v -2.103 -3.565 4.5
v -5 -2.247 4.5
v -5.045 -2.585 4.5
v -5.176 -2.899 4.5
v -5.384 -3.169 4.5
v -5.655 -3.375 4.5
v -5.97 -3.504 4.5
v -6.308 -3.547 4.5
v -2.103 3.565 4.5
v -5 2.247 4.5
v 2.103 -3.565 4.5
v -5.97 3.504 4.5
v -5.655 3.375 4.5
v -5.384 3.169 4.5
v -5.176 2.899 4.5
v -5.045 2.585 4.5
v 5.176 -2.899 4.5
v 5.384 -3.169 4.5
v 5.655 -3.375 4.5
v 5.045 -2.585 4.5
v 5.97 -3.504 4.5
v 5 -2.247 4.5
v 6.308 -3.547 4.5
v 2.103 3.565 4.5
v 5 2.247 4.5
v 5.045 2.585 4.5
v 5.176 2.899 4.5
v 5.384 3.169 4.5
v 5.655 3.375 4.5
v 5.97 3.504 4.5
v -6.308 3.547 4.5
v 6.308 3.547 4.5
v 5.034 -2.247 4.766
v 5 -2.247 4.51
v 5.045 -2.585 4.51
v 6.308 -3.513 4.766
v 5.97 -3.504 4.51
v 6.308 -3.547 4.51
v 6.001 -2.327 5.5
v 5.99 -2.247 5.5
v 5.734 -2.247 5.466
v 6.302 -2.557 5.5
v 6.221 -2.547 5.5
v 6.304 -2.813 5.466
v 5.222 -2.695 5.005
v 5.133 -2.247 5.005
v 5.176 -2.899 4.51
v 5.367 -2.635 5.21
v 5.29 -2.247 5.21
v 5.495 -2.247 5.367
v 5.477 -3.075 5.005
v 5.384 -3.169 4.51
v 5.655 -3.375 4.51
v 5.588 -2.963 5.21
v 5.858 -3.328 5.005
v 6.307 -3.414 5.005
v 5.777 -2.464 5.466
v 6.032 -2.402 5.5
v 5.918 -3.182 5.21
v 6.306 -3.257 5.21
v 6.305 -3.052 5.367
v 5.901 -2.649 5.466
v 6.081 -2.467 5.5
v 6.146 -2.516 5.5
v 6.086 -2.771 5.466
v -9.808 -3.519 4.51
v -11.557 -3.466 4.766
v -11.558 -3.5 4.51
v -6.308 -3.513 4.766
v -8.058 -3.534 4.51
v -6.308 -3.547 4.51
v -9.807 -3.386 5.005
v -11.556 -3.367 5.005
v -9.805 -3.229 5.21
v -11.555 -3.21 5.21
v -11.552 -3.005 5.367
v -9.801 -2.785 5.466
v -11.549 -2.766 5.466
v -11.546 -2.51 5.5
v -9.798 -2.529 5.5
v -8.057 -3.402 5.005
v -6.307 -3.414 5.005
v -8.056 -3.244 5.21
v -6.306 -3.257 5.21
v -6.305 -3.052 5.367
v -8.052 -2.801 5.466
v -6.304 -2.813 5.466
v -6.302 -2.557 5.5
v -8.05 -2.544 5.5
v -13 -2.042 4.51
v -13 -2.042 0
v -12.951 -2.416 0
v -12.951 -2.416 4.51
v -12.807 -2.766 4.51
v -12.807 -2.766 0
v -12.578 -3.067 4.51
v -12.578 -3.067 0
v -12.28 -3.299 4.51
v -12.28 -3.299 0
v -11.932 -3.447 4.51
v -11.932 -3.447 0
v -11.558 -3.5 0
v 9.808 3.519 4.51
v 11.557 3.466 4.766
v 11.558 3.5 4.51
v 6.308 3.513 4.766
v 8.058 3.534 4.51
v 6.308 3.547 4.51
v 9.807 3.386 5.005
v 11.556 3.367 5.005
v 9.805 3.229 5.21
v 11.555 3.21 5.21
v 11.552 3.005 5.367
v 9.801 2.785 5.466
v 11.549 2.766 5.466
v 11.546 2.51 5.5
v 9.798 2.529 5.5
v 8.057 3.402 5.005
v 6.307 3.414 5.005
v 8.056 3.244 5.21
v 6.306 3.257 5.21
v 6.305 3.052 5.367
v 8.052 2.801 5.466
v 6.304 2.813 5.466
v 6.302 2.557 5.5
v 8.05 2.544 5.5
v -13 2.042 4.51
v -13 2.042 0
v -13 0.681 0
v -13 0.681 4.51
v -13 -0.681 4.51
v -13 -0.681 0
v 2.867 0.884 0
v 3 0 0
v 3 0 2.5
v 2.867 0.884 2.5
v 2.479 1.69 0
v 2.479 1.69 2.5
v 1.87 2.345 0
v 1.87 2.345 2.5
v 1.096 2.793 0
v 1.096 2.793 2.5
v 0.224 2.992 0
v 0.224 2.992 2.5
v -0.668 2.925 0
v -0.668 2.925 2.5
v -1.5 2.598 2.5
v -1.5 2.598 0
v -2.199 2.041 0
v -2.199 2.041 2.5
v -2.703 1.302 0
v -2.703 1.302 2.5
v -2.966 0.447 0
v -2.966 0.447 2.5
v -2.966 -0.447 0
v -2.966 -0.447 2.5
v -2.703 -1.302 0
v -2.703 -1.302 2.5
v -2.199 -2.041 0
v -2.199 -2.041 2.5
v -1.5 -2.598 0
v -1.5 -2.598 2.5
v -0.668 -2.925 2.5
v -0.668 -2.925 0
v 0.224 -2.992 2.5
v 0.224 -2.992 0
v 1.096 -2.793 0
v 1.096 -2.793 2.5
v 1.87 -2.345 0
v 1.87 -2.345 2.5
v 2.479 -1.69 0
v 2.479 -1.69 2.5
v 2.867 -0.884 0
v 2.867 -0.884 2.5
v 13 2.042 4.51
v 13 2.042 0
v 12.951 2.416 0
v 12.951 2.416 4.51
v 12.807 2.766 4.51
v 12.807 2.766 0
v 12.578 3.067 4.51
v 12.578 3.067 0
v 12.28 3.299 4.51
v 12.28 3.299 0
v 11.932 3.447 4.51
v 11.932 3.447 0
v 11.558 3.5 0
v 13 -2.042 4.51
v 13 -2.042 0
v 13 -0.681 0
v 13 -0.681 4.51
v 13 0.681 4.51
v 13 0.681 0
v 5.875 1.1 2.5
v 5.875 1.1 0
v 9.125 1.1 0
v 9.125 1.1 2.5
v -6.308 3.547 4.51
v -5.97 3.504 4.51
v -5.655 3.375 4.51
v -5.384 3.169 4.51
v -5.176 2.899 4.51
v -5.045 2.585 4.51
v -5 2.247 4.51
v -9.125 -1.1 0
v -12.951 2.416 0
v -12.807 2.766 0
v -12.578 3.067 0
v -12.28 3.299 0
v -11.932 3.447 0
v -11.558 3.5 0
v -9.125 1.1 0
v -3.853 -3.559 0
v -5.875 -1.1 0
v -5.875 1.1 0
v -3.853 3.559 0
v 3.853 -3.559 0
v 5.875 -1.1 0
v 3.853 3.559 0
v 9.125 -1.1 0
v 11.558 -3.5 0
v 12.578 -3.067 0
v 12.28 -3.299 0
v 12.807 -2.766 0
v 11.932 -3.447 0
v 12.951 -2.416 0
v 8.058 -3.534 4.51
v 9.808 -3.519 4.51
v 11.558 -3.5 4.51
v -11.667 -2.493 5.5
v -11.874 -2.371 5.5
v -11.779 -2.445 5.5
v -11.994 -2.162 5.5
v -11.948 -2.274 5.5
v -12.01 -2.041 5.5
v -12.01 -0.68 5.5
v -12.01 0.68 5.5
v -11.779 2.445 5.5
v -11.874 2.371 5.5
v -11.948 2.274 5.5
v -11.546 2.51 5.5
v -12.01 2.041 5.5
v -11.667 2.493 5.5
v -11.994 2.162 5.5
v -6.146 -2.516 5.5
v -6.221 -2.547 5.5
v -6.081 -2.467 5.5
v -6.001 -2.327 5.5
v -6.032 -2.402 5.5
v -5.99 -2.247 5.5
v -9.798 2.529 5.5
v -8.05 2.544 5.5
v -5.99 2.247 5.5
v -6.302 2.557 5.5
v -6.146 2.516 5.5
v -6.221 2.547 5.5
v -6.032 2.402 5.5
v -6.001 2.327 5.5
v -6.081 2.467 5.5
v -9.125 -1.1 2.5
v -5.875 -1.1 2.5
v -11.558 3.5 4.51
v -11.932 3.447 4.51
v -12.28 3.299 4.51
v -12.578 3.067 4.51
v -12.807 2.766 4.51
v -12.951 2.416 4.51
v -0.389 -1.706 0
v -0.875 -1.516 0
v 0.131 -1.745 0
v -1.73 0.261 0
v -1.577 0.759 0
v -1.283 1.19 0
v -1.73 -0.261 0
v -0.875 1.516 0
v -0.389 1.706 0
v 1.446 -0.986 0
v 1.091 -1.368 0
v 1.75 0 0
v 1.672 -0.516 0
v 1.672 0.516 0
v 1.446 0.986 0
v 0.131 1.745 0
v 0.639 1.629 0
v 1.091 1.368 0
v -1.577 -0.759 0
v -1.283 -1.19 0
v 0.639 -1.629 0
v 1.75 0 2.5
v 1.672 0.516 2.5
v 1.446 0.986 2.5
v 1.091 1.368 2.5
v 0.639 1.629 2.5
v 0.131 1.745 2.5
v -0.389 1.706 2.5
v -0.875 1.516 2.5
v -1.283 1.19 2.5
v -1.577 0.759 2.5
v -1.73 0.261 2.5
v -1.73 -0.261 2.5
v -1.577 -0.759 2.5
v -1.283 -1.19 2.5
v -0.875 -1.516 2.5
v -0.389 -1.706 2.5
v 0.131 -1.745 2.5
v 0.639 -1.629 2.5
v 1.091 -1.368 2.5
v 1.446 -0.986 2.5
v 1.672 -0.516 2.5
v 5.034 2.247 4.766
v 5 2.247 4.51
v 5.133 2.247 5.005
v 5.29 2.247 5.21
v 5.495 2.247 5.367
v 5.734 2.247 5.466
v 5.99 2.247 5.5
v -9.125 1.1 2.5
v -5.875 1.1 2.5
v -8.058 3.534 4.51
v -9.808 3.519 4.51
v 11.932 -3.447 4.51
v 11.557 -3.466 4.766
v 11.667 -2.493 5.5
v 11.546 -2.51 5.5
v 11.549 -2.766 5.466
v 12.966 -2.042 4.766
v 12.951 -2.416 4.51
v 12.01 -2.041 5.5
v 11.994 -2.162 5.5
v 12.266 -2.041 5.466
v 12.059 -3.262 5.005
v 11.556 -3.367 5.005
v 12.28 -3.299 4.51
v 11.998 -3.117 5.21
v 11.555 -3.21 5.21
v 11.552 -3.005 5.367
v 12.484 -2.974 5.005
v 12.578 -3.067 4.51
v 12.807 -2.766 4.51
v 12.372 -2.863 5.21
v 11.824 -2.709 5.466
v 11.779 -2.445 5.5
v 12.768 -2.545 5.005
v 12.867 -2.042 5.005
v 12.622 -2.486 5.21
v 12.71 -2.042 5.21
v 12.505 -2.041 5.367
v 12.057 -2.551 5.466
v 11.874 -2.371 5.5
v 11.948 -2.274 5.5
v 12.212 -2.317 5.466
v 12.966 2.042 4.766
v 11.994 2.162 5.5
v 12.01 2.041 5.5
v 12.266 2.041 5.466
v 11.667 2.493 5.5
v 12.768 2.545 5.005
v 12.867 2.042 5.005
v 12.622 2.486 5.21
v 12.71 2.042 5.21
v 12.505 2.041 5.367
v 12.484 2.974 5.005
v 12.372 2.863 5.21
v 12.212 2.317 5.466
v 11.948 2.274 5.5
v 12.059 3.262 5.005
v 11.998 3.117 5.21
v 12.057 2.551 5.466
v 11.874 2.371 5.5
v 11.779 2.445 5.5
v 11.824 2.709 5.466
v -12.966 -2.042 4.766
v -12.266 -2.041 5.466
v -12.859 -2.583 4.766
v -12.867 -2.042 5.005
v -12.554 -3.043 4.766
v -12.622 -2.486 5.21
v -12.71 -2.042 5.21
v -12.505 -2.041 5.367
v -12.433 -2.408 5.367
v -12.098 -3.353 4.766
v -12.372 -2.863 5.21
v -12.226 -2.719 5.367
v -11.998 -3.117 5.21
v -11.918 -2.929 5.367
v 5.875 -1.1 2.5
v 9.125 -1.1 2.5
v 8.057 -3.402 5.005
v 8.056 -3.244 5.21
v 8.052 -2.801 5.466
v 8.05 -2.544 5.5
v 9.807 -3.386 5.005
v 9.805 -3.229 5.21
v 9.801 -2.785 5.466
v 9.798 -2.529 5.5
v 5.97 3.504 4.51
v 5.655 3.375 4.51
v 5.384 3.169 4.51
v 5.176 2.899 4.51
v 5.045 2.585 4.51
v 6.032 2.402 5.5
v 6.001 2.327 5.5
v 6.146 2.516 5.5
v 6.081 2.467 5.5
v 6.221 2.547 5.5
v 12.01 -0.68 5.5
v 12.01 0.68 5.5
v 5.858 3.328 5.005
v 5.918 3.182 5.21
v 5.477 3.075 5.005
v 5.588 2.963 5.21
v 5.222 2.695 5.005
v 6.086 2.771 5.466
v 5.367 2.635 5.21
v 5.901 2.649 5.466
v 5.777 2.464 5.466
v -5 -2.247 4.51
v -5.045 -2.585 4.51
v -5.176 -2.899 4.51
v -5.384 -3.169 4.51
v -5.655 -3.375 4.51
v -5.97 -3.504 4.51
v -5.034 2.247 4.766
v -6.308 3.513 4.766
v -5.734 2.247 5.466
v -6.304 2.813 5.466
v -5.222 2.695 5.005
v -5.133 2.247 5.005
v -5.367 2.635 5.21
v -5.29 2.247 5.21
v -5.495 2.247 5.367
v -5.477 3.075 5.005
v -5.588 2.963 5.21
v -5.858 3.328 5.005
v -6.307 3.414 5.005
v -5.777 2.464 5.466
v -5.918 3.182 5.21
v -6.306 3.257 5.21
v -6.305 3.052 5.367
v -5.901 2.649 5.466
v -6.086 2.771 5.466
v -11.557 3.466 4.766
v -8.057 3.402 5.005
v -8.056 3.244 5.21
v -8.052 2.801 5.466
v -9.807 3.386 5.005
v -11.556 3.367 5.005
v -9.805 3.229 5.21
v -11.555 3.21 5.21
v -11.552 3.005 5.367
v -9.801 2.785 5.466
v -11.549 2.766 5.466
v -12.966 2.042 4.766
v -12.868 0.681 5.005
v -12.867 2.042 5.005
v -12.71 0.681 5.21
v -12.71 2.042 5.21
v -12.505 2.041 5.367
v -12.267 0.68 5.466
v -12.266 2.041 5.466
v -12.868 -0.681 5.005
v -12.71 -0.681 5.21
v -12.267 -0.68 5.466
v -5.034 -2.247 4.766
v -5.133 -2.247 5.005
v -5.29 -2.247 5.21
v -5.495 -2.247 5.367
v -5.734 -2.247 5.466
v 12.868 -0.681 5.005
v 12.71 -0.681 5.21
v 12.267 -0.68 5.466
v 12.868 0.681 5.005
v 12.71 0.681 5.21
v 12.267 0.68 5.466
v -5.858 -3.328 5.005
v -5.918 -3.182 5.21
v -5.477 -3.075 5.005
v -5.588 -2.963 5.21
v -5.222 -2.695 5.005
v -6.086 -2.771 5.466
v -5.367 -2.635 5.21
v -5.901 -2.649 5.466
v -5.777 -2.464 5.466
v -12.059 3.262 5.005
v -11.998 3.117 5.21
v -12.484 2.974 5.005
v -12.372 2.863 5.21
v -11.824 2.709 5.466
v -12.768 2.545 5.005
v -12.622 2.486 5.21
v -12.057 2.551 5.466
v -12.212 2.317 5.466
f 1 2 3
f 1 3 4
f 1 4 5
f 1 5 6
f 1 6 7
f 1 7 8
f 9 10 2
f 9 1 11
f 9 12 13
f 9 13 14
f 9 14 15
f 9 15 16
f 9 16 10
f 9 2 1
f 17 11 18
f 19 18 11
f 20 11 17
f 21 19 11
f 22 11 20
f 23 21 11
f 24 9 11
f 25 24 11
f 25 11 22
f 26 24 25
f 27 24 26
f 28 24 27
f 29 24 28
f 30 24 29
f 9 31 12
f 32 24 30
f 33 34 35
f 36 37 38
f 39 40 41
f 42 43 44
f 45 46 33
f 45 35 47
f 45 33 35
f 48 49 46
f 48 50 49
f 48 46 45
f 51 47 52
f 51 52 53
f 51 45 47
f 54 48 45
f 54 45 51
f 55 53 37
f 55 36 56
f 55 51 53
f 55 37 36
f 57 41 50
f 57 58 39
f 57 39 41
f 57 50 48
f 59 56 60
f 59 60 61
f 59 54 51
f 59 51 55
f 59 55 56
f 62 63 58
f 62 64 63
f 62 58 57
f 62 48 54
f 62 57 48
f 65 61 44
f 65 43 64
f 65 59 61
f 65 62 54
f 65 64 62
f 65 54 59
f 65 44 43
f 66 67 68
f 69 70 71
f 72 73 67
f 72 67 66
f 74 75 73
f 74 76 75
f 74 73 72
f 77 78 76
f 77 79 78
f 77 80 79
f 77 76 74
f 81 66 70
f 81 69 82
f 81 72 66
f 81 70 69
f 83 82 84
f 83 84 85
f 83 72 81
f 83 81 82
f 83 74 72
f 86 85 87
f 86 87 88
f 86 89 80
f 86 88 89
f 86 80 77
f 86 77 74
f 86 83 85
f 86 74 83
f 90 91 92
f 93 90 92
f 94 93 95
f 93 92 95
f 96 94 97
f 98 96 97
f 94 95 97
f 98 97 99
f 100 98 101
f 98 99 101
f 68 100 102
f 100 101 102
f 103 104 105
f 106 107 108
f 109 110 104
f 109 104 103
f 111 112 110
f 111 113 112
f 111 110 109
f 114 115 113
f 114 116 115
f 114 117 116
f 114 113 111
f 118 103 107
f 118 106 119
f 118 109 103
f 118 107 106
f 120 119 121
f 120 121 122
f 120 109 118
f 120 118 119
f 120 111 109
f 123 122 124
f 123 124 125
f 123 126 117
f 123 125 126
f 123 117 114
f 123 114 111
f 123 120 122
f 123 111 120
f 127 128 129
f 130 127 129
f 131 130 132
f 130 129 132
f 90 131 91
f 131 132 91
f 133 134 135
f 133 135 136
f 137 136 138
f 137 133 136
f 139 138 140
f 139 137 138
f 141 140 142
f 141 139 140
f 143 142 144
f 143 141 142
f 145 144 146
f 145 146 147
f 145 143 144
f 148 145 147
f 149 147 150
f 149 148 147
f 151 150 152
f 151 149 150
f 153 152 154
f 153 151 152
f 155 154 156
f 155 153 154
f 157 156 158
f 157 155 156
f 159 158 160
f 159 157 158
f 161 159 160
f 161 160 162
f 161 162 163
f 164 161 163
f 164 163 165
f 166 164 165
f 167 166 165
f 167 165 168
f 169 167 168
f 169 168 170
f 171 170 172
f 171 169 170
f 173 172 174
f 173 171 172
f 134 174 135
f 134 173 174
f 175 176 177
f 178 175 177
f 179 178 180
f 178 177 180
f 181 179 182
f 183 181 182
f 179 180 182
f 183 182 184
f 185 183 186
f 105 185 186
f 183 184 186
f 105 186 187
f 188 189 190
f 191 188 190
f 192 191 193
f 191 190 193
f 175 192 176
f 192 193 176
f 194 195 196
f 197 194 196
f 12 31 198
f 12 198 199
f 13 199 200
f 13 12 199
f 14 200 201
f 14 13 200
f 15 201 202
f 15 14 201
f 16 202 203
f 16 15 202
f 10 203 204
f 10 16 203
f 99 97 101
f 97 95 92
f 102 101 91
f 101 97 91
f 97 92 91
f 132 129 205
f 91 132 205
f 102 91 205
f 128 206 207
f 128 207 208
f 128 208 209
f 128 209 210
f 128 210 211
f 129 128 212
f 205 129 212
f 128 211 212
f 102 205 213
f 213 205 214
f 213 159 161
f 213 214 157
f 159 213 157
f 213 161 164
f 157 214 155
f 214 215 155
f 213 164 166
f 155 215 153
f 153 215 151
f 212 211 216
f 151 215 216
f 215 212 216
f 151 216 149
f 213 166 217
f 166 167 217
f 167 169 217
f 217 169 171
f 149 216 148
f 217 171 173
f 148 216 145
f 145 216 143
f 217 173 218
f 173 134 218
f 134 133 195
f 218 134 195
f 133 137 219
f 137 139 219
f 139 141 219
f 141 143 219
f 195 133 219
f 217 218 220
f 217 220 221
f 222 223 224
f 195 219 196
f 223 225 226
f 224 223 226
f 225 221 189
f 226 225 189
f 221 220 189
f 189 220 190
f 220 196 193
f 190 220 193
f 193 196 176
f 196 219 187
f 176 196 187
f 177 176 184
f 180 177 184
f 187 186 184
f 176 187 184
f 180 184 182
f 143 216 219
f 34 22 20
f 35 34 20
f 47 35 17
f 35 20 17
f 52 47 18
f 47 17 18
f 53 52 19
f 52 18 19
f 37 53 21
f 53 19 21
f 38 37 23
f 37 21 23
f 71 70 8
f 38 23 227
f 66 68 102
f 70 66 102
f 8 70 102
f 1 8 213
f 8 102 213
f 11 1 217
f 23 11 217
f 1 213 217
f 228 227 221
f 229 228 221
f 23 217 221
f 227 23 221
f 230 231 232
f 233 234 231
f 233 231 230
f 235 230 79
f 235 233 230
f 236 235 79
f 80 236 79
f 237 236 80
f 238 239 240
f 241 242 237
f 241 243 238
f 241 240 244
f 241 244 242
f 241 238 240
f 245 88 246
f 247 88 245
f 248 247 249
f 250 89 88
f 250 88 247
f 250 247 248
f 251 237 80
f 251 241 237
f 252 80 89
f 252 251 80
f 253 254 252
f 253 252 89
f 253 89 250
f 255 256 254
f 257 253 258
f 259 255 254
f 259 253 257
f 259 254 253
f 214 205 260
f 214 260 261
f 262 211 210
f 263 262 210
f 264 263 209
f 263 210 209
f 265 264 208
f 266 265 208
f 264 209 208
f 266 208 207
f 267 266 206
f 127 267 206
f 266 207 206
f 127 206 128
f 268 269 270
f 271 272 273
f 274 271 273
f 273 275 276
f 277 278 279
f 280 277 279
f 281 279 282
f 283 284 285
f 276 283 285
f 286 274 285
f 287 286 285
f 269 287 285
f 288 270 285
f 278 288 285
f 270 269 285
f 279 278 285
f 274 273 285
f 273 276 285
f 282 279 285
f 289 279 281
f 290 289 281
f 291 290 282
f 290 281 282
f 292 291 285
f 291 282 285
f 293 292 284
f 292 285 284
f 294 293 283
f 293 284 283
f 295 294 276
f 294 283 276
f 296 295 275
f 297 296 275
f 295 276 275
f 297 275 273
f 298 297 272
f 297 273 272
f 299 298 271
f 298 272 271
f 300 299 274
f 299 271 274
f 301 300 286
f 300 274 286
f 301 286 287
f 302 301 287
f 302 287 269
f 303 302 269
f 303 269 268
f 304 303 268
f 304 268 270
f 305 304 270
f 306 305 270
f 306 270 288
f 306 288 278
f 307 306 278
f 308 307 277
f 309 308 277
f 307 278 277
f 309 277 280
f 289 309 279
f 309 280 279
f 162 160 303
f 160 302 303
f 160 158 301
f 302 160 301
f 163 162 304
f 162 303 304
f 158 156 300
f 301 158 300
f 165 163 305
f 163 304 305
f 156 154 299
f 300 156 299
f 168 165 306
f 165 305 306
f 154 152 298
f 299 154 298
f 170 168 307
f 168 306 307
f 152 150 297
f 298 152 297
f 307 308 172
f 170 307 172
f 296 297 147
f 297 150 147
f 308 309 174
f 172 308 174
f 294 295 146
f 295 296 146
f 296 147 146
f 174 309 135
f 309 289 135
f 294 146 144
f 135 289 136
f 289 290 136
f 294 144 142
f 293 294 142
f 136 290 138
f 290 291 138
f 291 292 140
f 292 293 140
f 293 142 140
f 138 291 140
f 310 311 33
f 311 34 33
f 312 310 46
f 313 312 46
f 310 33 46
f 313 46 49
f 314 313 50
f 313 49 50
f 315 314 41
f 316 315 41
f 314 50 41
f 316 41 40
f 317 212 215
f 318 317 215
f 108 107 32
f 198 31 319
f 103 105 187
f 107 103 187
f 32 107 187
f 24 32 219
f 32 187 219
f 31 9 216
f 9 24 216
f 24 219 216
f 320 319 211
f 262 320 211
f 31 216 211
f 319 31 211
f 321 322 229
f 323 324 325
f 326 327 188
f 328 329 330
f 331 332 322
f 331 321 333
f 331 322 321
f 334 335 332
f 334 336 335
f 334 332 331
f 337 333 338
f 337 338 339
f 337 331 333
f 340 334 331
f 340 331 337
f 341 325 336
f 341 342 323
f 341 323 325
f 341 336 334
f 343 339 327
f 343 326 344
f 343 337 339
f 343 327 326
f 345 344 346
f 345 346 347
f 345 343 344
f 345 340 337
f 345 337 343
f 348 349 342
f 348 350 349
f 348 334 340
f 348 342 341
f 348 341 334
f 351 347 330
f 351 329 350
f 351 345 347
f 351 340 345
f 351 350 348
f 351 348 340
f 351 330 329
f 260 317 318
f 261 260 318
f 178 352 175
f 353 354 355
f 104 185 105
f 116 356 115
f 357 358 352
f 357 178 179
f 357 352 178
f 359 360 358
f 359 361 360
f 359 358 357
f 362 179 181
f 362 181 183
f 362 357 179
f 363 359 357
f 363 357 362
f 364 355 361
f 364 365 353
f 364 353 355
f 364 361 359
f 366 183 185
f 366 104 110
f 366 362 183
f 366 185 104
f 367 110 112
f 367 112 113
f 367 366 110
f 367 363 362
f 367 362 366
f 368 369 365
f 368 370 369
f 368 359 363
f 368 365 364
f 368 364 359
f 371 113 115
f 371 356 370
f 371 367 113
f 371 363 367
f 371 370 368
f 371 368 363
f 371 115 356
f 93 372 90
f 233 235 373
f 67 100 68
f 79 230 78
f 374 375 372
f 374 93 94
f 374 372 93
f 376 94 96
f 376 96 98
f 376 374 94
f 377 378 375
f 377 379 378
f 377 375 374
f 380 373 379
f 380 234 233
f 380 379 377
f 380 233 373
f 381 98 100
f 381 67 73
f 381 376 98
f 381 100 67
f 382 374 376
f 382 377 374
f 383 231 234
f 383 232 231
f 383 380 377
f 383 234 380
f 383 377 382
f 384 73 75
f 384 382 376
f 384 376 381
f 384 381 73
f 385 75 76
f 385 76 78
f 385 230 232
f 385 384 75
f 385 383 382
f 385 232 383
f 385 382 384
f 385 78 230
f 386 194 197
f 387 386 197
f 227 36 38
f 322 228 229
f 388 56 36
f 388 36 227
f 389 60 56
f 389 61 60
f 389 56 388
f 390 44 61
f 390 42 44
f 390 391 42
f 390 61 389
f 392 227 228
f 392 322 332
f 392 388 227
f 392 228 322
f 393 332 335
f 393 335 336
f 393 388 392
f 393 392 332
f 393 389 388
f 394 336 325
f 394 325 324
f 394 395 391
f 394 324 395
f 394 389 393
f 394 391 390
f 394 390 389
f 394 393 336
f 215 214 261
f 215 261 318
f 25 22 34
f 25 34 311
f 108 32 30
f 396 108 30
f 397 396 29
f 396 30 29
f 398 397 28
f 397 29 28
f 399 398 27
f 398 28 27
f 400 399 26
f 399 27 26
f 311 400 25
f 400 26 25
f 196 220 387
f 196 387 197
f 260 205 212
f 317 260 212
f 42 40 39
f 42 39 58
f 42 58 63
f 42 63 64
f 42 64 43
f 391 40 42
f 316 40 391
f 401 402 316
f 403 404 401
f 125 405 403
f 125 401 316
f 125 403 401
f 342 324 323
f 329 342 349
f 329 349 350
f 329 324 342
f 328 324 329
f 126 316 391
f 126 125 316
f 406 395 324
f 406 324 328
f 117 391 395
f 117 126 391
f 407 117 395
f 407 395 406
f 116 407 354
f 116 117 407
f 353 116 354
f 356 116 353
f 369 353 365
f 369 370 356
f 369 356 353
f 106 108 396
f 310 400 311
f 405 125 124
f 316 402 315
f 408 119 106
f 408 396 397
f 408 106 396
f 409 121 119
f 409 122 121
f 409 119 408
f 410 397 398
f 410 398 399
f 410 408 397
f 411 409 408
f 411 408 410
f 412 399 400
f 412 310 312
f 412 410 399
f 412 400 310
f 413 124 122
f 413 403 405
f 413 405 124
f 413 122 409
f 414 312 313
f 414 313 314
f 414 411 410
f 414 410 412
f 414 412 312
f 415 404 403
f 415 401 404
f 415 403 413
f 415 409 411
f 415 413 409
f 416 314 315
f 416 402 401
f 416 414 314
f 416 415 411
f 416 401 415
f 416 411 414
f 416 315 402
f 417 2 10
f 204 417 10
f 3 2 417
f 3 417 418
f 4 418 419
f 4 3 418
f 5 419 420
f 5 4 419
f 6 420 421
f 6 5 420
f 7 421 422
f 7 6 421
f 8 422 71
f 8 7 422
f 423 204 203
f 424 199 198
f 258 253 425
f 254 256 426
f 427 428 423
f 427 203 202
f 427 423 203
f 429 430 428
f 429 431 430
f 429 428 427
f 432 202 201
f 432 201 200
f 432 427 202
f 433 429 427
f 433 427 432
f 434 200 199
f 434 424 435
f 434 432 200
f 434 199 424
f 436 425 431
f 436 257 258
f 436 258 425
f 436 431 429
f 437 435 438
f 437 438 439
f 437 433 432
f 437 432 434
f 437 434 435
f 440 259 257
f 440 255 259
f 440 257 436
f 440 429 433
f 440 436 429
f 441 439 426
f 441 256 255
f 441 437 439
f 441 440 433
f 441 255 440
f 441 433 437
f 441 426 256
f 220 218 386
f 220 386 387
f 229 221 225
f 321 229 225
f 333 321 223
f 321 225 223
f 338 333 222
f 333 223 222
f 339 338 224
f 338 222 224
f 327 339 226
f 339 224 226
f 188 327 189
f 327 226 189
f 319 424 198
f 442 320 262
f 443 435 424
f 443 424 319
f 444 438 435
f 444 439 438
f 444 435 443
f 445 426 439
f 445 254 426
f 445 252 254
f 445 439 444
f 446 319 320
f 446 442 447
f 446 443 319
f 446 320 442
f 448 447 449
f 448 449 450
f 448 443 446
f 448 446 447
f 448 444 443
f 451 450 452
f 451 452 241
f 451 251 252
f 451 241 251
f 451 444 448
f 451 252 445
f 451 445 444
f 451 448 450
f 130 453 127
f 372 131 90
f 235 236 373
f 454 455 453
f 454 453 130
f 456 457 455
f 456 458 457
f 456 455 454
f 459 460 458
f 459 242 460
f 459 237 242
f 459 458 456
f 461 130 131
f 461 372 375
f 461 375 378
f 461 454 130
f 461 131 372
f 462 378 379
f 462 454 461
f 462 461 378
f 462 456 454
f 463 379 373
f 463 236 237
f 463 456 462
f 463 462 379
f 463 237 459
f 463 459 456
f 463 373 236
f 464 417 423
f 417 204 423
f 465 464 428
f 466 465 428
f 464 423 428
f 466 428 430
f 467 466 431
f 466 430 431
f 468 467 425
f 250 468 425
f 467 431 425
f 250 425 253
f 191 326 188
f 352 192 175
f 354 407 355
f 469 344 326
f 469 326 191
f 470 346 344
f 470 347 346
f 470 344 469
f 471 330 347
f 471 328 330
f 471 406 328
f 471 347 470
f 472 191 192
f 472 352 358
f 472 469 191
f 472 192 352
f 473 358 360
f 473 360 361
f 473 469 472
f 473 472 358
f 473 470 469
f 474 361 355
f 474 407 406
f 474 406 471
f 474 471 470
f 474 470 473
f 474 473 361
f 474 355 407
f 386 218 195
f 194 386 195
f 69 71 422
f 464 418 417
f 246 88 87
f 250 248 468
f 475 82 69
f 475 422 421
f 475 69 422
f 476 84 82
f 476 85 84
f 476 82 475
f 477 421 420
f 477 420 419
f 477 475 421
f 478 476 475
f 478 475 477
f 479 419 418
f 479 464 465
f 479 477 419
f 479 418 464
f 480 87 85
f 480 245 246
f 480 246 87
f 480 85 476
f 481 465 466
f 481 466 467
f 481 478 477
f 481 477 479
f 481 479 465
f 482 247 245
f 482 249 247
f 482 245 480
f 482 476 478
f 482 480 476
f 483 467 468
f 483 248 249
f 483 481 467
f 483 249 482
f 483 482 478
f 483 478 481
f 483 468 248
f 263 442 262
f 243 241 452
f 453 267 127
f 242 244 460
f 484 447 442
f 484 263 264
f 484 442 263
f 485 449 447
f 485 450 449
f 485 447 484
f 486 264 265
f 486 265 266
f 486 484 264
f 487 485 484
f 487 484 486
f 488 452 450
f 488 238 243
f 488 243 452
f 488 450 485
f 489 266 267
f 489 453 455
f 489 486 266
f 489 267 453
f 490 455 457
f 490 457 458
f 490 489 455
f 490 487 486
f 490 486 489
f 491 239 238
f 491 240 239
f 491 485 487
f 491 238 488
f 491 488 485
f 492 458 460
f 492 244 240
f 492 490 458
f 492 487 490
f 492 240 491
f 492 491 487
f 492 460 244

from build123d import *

# Parameters (mm, degrees)
SKETCH039_R   = 3
SKETCH039_R_2 = 1.75
SKETCH039_W   = 3.25
SKETCH039_H   = 2.2
PAD022_DEPTH  = 2.5
SKETCH026_W   = 10
SKETCH026_H   = 9
PAD020_DEPTH  = 2
PAD019_DEPTH  = 5.5
FILLET003_R   = 1.3
FILLET004_R   = 0.99


with BuildPart() as pad_button_zoom_holes:
    # Sketch039 → Pad022 (new body)
    with BuildSketch(Plane.XY):
        Circle(SKETCH039_R)
        Circle(SKETCH039_R_2, mode=Mode.SUBTRACT)
        with Locations((-7.5, 0)):
            Rectangle(SKETCH039_W, SKETCH039_H)
        with Locations((7.5, 0)):
            Rectangle(SKETCH039_W, SKETCH039_H)
    extrude(amount=PAD022_DEPTH)


with BuildPart() as pad_button_zoom_cutout:
    # Sketch026 → Pad020 (new body)
    with BuildSketch(Plane.XY.offset(4.5)):
        Rectangle(SKETCH026_W, SKETCH026_H)
    extrude(amount=PAD020_DEPTH)


with BuildPart() as cut_button_zoom_final:
    # Sketch025 → Pad019 (new body)
    with BuildSketch(Plane.XY):
        with BuildLine():
            ThreePointArc((11.557852, 3.5), (0, 3.566794), (-11.557852, 3.5))
            ThreePointArc((-11.557852, 3.5), (-12.578424, 3.066971), (-12.999999, 2.041615))
            ThreePointArc((-12.999999, 2.041615), (-13.000368, 0), (-13, -2.041615))
            ThreePointArc((-13, -2.041615), (-12.578425, -3.066972), (-11.557852, -3.5))
            ThreePointArc((-11.557852, -3.5), (0, -3.566794), (11.557852, -3.5))
            ThreePointArc((11.557852, -3.5), (12.578425, -3.066972), (13, -2.041615))
            ThreePointArc((13, -2.041615), (13.000368, 0), (12.999999, 2.041615))
            ThreePointArc((12.999999, 2.041615), (12.578424, 3.066971), (11.557852, 3.5))
        make_face()
    extrude(amount=PAD019_DEPTH)

    # Cut007: cut Pad (button zoom cutout)
    add(pad_button_zoom_cutout.part, mode=Mode.SUBTRACT)

    # Fillet003
    fillet003_edges = [cut_button_zoom_final.edges().sort_by_distance(p)[0] for p in [
        (-5, 3.554294, 5),
        (5, 3.554294, 5),
        (-5, -3.554294, 5),
        (5, -3.554294, 5),
    ]]
    fillet(fillet003_edges, radius=FILLET003_R)

    # Fillet004
    fillet004_edges = [cut_button_zoom_final.edges().sort_by_distance(p)[0] for p in [
        (-8.933057, 3.526894, 5.5),
        (8.933057, 3.526894, 5.5),
        (-5.383665, 3.169057, 5.5),
        (-12.578424, 3.066971, 5.5),
        (-5, 0, 5.5),
        (-13.000368, 0, 5.5),
        (-5.383665, -3.169057, 5.5),
        (-12.578425, -3.066972, 5.5),
        (-8.933057, -3.526894, 5.5),
        (12.578424, 3.066971, 5.5),
        (5.383665, 3.169057, 5.5),
        (5, 0, 5.5),
        (13.000368, 0, 5.5),
        (5.383665, -3.169057, 5.5),
        (12.578425, -3.066972, 5.5),
        (8.933057, -3.526894, 5.5),
    ]]
    fillet(fillet004_edges, radius=FILLET004_R)

    # Cut: cut Pad (button zoom holes)
    add(pad_button_zoom_holes.part, mode=Mode.SUBTRACT)


solid = cut_button_zoom_final.part
